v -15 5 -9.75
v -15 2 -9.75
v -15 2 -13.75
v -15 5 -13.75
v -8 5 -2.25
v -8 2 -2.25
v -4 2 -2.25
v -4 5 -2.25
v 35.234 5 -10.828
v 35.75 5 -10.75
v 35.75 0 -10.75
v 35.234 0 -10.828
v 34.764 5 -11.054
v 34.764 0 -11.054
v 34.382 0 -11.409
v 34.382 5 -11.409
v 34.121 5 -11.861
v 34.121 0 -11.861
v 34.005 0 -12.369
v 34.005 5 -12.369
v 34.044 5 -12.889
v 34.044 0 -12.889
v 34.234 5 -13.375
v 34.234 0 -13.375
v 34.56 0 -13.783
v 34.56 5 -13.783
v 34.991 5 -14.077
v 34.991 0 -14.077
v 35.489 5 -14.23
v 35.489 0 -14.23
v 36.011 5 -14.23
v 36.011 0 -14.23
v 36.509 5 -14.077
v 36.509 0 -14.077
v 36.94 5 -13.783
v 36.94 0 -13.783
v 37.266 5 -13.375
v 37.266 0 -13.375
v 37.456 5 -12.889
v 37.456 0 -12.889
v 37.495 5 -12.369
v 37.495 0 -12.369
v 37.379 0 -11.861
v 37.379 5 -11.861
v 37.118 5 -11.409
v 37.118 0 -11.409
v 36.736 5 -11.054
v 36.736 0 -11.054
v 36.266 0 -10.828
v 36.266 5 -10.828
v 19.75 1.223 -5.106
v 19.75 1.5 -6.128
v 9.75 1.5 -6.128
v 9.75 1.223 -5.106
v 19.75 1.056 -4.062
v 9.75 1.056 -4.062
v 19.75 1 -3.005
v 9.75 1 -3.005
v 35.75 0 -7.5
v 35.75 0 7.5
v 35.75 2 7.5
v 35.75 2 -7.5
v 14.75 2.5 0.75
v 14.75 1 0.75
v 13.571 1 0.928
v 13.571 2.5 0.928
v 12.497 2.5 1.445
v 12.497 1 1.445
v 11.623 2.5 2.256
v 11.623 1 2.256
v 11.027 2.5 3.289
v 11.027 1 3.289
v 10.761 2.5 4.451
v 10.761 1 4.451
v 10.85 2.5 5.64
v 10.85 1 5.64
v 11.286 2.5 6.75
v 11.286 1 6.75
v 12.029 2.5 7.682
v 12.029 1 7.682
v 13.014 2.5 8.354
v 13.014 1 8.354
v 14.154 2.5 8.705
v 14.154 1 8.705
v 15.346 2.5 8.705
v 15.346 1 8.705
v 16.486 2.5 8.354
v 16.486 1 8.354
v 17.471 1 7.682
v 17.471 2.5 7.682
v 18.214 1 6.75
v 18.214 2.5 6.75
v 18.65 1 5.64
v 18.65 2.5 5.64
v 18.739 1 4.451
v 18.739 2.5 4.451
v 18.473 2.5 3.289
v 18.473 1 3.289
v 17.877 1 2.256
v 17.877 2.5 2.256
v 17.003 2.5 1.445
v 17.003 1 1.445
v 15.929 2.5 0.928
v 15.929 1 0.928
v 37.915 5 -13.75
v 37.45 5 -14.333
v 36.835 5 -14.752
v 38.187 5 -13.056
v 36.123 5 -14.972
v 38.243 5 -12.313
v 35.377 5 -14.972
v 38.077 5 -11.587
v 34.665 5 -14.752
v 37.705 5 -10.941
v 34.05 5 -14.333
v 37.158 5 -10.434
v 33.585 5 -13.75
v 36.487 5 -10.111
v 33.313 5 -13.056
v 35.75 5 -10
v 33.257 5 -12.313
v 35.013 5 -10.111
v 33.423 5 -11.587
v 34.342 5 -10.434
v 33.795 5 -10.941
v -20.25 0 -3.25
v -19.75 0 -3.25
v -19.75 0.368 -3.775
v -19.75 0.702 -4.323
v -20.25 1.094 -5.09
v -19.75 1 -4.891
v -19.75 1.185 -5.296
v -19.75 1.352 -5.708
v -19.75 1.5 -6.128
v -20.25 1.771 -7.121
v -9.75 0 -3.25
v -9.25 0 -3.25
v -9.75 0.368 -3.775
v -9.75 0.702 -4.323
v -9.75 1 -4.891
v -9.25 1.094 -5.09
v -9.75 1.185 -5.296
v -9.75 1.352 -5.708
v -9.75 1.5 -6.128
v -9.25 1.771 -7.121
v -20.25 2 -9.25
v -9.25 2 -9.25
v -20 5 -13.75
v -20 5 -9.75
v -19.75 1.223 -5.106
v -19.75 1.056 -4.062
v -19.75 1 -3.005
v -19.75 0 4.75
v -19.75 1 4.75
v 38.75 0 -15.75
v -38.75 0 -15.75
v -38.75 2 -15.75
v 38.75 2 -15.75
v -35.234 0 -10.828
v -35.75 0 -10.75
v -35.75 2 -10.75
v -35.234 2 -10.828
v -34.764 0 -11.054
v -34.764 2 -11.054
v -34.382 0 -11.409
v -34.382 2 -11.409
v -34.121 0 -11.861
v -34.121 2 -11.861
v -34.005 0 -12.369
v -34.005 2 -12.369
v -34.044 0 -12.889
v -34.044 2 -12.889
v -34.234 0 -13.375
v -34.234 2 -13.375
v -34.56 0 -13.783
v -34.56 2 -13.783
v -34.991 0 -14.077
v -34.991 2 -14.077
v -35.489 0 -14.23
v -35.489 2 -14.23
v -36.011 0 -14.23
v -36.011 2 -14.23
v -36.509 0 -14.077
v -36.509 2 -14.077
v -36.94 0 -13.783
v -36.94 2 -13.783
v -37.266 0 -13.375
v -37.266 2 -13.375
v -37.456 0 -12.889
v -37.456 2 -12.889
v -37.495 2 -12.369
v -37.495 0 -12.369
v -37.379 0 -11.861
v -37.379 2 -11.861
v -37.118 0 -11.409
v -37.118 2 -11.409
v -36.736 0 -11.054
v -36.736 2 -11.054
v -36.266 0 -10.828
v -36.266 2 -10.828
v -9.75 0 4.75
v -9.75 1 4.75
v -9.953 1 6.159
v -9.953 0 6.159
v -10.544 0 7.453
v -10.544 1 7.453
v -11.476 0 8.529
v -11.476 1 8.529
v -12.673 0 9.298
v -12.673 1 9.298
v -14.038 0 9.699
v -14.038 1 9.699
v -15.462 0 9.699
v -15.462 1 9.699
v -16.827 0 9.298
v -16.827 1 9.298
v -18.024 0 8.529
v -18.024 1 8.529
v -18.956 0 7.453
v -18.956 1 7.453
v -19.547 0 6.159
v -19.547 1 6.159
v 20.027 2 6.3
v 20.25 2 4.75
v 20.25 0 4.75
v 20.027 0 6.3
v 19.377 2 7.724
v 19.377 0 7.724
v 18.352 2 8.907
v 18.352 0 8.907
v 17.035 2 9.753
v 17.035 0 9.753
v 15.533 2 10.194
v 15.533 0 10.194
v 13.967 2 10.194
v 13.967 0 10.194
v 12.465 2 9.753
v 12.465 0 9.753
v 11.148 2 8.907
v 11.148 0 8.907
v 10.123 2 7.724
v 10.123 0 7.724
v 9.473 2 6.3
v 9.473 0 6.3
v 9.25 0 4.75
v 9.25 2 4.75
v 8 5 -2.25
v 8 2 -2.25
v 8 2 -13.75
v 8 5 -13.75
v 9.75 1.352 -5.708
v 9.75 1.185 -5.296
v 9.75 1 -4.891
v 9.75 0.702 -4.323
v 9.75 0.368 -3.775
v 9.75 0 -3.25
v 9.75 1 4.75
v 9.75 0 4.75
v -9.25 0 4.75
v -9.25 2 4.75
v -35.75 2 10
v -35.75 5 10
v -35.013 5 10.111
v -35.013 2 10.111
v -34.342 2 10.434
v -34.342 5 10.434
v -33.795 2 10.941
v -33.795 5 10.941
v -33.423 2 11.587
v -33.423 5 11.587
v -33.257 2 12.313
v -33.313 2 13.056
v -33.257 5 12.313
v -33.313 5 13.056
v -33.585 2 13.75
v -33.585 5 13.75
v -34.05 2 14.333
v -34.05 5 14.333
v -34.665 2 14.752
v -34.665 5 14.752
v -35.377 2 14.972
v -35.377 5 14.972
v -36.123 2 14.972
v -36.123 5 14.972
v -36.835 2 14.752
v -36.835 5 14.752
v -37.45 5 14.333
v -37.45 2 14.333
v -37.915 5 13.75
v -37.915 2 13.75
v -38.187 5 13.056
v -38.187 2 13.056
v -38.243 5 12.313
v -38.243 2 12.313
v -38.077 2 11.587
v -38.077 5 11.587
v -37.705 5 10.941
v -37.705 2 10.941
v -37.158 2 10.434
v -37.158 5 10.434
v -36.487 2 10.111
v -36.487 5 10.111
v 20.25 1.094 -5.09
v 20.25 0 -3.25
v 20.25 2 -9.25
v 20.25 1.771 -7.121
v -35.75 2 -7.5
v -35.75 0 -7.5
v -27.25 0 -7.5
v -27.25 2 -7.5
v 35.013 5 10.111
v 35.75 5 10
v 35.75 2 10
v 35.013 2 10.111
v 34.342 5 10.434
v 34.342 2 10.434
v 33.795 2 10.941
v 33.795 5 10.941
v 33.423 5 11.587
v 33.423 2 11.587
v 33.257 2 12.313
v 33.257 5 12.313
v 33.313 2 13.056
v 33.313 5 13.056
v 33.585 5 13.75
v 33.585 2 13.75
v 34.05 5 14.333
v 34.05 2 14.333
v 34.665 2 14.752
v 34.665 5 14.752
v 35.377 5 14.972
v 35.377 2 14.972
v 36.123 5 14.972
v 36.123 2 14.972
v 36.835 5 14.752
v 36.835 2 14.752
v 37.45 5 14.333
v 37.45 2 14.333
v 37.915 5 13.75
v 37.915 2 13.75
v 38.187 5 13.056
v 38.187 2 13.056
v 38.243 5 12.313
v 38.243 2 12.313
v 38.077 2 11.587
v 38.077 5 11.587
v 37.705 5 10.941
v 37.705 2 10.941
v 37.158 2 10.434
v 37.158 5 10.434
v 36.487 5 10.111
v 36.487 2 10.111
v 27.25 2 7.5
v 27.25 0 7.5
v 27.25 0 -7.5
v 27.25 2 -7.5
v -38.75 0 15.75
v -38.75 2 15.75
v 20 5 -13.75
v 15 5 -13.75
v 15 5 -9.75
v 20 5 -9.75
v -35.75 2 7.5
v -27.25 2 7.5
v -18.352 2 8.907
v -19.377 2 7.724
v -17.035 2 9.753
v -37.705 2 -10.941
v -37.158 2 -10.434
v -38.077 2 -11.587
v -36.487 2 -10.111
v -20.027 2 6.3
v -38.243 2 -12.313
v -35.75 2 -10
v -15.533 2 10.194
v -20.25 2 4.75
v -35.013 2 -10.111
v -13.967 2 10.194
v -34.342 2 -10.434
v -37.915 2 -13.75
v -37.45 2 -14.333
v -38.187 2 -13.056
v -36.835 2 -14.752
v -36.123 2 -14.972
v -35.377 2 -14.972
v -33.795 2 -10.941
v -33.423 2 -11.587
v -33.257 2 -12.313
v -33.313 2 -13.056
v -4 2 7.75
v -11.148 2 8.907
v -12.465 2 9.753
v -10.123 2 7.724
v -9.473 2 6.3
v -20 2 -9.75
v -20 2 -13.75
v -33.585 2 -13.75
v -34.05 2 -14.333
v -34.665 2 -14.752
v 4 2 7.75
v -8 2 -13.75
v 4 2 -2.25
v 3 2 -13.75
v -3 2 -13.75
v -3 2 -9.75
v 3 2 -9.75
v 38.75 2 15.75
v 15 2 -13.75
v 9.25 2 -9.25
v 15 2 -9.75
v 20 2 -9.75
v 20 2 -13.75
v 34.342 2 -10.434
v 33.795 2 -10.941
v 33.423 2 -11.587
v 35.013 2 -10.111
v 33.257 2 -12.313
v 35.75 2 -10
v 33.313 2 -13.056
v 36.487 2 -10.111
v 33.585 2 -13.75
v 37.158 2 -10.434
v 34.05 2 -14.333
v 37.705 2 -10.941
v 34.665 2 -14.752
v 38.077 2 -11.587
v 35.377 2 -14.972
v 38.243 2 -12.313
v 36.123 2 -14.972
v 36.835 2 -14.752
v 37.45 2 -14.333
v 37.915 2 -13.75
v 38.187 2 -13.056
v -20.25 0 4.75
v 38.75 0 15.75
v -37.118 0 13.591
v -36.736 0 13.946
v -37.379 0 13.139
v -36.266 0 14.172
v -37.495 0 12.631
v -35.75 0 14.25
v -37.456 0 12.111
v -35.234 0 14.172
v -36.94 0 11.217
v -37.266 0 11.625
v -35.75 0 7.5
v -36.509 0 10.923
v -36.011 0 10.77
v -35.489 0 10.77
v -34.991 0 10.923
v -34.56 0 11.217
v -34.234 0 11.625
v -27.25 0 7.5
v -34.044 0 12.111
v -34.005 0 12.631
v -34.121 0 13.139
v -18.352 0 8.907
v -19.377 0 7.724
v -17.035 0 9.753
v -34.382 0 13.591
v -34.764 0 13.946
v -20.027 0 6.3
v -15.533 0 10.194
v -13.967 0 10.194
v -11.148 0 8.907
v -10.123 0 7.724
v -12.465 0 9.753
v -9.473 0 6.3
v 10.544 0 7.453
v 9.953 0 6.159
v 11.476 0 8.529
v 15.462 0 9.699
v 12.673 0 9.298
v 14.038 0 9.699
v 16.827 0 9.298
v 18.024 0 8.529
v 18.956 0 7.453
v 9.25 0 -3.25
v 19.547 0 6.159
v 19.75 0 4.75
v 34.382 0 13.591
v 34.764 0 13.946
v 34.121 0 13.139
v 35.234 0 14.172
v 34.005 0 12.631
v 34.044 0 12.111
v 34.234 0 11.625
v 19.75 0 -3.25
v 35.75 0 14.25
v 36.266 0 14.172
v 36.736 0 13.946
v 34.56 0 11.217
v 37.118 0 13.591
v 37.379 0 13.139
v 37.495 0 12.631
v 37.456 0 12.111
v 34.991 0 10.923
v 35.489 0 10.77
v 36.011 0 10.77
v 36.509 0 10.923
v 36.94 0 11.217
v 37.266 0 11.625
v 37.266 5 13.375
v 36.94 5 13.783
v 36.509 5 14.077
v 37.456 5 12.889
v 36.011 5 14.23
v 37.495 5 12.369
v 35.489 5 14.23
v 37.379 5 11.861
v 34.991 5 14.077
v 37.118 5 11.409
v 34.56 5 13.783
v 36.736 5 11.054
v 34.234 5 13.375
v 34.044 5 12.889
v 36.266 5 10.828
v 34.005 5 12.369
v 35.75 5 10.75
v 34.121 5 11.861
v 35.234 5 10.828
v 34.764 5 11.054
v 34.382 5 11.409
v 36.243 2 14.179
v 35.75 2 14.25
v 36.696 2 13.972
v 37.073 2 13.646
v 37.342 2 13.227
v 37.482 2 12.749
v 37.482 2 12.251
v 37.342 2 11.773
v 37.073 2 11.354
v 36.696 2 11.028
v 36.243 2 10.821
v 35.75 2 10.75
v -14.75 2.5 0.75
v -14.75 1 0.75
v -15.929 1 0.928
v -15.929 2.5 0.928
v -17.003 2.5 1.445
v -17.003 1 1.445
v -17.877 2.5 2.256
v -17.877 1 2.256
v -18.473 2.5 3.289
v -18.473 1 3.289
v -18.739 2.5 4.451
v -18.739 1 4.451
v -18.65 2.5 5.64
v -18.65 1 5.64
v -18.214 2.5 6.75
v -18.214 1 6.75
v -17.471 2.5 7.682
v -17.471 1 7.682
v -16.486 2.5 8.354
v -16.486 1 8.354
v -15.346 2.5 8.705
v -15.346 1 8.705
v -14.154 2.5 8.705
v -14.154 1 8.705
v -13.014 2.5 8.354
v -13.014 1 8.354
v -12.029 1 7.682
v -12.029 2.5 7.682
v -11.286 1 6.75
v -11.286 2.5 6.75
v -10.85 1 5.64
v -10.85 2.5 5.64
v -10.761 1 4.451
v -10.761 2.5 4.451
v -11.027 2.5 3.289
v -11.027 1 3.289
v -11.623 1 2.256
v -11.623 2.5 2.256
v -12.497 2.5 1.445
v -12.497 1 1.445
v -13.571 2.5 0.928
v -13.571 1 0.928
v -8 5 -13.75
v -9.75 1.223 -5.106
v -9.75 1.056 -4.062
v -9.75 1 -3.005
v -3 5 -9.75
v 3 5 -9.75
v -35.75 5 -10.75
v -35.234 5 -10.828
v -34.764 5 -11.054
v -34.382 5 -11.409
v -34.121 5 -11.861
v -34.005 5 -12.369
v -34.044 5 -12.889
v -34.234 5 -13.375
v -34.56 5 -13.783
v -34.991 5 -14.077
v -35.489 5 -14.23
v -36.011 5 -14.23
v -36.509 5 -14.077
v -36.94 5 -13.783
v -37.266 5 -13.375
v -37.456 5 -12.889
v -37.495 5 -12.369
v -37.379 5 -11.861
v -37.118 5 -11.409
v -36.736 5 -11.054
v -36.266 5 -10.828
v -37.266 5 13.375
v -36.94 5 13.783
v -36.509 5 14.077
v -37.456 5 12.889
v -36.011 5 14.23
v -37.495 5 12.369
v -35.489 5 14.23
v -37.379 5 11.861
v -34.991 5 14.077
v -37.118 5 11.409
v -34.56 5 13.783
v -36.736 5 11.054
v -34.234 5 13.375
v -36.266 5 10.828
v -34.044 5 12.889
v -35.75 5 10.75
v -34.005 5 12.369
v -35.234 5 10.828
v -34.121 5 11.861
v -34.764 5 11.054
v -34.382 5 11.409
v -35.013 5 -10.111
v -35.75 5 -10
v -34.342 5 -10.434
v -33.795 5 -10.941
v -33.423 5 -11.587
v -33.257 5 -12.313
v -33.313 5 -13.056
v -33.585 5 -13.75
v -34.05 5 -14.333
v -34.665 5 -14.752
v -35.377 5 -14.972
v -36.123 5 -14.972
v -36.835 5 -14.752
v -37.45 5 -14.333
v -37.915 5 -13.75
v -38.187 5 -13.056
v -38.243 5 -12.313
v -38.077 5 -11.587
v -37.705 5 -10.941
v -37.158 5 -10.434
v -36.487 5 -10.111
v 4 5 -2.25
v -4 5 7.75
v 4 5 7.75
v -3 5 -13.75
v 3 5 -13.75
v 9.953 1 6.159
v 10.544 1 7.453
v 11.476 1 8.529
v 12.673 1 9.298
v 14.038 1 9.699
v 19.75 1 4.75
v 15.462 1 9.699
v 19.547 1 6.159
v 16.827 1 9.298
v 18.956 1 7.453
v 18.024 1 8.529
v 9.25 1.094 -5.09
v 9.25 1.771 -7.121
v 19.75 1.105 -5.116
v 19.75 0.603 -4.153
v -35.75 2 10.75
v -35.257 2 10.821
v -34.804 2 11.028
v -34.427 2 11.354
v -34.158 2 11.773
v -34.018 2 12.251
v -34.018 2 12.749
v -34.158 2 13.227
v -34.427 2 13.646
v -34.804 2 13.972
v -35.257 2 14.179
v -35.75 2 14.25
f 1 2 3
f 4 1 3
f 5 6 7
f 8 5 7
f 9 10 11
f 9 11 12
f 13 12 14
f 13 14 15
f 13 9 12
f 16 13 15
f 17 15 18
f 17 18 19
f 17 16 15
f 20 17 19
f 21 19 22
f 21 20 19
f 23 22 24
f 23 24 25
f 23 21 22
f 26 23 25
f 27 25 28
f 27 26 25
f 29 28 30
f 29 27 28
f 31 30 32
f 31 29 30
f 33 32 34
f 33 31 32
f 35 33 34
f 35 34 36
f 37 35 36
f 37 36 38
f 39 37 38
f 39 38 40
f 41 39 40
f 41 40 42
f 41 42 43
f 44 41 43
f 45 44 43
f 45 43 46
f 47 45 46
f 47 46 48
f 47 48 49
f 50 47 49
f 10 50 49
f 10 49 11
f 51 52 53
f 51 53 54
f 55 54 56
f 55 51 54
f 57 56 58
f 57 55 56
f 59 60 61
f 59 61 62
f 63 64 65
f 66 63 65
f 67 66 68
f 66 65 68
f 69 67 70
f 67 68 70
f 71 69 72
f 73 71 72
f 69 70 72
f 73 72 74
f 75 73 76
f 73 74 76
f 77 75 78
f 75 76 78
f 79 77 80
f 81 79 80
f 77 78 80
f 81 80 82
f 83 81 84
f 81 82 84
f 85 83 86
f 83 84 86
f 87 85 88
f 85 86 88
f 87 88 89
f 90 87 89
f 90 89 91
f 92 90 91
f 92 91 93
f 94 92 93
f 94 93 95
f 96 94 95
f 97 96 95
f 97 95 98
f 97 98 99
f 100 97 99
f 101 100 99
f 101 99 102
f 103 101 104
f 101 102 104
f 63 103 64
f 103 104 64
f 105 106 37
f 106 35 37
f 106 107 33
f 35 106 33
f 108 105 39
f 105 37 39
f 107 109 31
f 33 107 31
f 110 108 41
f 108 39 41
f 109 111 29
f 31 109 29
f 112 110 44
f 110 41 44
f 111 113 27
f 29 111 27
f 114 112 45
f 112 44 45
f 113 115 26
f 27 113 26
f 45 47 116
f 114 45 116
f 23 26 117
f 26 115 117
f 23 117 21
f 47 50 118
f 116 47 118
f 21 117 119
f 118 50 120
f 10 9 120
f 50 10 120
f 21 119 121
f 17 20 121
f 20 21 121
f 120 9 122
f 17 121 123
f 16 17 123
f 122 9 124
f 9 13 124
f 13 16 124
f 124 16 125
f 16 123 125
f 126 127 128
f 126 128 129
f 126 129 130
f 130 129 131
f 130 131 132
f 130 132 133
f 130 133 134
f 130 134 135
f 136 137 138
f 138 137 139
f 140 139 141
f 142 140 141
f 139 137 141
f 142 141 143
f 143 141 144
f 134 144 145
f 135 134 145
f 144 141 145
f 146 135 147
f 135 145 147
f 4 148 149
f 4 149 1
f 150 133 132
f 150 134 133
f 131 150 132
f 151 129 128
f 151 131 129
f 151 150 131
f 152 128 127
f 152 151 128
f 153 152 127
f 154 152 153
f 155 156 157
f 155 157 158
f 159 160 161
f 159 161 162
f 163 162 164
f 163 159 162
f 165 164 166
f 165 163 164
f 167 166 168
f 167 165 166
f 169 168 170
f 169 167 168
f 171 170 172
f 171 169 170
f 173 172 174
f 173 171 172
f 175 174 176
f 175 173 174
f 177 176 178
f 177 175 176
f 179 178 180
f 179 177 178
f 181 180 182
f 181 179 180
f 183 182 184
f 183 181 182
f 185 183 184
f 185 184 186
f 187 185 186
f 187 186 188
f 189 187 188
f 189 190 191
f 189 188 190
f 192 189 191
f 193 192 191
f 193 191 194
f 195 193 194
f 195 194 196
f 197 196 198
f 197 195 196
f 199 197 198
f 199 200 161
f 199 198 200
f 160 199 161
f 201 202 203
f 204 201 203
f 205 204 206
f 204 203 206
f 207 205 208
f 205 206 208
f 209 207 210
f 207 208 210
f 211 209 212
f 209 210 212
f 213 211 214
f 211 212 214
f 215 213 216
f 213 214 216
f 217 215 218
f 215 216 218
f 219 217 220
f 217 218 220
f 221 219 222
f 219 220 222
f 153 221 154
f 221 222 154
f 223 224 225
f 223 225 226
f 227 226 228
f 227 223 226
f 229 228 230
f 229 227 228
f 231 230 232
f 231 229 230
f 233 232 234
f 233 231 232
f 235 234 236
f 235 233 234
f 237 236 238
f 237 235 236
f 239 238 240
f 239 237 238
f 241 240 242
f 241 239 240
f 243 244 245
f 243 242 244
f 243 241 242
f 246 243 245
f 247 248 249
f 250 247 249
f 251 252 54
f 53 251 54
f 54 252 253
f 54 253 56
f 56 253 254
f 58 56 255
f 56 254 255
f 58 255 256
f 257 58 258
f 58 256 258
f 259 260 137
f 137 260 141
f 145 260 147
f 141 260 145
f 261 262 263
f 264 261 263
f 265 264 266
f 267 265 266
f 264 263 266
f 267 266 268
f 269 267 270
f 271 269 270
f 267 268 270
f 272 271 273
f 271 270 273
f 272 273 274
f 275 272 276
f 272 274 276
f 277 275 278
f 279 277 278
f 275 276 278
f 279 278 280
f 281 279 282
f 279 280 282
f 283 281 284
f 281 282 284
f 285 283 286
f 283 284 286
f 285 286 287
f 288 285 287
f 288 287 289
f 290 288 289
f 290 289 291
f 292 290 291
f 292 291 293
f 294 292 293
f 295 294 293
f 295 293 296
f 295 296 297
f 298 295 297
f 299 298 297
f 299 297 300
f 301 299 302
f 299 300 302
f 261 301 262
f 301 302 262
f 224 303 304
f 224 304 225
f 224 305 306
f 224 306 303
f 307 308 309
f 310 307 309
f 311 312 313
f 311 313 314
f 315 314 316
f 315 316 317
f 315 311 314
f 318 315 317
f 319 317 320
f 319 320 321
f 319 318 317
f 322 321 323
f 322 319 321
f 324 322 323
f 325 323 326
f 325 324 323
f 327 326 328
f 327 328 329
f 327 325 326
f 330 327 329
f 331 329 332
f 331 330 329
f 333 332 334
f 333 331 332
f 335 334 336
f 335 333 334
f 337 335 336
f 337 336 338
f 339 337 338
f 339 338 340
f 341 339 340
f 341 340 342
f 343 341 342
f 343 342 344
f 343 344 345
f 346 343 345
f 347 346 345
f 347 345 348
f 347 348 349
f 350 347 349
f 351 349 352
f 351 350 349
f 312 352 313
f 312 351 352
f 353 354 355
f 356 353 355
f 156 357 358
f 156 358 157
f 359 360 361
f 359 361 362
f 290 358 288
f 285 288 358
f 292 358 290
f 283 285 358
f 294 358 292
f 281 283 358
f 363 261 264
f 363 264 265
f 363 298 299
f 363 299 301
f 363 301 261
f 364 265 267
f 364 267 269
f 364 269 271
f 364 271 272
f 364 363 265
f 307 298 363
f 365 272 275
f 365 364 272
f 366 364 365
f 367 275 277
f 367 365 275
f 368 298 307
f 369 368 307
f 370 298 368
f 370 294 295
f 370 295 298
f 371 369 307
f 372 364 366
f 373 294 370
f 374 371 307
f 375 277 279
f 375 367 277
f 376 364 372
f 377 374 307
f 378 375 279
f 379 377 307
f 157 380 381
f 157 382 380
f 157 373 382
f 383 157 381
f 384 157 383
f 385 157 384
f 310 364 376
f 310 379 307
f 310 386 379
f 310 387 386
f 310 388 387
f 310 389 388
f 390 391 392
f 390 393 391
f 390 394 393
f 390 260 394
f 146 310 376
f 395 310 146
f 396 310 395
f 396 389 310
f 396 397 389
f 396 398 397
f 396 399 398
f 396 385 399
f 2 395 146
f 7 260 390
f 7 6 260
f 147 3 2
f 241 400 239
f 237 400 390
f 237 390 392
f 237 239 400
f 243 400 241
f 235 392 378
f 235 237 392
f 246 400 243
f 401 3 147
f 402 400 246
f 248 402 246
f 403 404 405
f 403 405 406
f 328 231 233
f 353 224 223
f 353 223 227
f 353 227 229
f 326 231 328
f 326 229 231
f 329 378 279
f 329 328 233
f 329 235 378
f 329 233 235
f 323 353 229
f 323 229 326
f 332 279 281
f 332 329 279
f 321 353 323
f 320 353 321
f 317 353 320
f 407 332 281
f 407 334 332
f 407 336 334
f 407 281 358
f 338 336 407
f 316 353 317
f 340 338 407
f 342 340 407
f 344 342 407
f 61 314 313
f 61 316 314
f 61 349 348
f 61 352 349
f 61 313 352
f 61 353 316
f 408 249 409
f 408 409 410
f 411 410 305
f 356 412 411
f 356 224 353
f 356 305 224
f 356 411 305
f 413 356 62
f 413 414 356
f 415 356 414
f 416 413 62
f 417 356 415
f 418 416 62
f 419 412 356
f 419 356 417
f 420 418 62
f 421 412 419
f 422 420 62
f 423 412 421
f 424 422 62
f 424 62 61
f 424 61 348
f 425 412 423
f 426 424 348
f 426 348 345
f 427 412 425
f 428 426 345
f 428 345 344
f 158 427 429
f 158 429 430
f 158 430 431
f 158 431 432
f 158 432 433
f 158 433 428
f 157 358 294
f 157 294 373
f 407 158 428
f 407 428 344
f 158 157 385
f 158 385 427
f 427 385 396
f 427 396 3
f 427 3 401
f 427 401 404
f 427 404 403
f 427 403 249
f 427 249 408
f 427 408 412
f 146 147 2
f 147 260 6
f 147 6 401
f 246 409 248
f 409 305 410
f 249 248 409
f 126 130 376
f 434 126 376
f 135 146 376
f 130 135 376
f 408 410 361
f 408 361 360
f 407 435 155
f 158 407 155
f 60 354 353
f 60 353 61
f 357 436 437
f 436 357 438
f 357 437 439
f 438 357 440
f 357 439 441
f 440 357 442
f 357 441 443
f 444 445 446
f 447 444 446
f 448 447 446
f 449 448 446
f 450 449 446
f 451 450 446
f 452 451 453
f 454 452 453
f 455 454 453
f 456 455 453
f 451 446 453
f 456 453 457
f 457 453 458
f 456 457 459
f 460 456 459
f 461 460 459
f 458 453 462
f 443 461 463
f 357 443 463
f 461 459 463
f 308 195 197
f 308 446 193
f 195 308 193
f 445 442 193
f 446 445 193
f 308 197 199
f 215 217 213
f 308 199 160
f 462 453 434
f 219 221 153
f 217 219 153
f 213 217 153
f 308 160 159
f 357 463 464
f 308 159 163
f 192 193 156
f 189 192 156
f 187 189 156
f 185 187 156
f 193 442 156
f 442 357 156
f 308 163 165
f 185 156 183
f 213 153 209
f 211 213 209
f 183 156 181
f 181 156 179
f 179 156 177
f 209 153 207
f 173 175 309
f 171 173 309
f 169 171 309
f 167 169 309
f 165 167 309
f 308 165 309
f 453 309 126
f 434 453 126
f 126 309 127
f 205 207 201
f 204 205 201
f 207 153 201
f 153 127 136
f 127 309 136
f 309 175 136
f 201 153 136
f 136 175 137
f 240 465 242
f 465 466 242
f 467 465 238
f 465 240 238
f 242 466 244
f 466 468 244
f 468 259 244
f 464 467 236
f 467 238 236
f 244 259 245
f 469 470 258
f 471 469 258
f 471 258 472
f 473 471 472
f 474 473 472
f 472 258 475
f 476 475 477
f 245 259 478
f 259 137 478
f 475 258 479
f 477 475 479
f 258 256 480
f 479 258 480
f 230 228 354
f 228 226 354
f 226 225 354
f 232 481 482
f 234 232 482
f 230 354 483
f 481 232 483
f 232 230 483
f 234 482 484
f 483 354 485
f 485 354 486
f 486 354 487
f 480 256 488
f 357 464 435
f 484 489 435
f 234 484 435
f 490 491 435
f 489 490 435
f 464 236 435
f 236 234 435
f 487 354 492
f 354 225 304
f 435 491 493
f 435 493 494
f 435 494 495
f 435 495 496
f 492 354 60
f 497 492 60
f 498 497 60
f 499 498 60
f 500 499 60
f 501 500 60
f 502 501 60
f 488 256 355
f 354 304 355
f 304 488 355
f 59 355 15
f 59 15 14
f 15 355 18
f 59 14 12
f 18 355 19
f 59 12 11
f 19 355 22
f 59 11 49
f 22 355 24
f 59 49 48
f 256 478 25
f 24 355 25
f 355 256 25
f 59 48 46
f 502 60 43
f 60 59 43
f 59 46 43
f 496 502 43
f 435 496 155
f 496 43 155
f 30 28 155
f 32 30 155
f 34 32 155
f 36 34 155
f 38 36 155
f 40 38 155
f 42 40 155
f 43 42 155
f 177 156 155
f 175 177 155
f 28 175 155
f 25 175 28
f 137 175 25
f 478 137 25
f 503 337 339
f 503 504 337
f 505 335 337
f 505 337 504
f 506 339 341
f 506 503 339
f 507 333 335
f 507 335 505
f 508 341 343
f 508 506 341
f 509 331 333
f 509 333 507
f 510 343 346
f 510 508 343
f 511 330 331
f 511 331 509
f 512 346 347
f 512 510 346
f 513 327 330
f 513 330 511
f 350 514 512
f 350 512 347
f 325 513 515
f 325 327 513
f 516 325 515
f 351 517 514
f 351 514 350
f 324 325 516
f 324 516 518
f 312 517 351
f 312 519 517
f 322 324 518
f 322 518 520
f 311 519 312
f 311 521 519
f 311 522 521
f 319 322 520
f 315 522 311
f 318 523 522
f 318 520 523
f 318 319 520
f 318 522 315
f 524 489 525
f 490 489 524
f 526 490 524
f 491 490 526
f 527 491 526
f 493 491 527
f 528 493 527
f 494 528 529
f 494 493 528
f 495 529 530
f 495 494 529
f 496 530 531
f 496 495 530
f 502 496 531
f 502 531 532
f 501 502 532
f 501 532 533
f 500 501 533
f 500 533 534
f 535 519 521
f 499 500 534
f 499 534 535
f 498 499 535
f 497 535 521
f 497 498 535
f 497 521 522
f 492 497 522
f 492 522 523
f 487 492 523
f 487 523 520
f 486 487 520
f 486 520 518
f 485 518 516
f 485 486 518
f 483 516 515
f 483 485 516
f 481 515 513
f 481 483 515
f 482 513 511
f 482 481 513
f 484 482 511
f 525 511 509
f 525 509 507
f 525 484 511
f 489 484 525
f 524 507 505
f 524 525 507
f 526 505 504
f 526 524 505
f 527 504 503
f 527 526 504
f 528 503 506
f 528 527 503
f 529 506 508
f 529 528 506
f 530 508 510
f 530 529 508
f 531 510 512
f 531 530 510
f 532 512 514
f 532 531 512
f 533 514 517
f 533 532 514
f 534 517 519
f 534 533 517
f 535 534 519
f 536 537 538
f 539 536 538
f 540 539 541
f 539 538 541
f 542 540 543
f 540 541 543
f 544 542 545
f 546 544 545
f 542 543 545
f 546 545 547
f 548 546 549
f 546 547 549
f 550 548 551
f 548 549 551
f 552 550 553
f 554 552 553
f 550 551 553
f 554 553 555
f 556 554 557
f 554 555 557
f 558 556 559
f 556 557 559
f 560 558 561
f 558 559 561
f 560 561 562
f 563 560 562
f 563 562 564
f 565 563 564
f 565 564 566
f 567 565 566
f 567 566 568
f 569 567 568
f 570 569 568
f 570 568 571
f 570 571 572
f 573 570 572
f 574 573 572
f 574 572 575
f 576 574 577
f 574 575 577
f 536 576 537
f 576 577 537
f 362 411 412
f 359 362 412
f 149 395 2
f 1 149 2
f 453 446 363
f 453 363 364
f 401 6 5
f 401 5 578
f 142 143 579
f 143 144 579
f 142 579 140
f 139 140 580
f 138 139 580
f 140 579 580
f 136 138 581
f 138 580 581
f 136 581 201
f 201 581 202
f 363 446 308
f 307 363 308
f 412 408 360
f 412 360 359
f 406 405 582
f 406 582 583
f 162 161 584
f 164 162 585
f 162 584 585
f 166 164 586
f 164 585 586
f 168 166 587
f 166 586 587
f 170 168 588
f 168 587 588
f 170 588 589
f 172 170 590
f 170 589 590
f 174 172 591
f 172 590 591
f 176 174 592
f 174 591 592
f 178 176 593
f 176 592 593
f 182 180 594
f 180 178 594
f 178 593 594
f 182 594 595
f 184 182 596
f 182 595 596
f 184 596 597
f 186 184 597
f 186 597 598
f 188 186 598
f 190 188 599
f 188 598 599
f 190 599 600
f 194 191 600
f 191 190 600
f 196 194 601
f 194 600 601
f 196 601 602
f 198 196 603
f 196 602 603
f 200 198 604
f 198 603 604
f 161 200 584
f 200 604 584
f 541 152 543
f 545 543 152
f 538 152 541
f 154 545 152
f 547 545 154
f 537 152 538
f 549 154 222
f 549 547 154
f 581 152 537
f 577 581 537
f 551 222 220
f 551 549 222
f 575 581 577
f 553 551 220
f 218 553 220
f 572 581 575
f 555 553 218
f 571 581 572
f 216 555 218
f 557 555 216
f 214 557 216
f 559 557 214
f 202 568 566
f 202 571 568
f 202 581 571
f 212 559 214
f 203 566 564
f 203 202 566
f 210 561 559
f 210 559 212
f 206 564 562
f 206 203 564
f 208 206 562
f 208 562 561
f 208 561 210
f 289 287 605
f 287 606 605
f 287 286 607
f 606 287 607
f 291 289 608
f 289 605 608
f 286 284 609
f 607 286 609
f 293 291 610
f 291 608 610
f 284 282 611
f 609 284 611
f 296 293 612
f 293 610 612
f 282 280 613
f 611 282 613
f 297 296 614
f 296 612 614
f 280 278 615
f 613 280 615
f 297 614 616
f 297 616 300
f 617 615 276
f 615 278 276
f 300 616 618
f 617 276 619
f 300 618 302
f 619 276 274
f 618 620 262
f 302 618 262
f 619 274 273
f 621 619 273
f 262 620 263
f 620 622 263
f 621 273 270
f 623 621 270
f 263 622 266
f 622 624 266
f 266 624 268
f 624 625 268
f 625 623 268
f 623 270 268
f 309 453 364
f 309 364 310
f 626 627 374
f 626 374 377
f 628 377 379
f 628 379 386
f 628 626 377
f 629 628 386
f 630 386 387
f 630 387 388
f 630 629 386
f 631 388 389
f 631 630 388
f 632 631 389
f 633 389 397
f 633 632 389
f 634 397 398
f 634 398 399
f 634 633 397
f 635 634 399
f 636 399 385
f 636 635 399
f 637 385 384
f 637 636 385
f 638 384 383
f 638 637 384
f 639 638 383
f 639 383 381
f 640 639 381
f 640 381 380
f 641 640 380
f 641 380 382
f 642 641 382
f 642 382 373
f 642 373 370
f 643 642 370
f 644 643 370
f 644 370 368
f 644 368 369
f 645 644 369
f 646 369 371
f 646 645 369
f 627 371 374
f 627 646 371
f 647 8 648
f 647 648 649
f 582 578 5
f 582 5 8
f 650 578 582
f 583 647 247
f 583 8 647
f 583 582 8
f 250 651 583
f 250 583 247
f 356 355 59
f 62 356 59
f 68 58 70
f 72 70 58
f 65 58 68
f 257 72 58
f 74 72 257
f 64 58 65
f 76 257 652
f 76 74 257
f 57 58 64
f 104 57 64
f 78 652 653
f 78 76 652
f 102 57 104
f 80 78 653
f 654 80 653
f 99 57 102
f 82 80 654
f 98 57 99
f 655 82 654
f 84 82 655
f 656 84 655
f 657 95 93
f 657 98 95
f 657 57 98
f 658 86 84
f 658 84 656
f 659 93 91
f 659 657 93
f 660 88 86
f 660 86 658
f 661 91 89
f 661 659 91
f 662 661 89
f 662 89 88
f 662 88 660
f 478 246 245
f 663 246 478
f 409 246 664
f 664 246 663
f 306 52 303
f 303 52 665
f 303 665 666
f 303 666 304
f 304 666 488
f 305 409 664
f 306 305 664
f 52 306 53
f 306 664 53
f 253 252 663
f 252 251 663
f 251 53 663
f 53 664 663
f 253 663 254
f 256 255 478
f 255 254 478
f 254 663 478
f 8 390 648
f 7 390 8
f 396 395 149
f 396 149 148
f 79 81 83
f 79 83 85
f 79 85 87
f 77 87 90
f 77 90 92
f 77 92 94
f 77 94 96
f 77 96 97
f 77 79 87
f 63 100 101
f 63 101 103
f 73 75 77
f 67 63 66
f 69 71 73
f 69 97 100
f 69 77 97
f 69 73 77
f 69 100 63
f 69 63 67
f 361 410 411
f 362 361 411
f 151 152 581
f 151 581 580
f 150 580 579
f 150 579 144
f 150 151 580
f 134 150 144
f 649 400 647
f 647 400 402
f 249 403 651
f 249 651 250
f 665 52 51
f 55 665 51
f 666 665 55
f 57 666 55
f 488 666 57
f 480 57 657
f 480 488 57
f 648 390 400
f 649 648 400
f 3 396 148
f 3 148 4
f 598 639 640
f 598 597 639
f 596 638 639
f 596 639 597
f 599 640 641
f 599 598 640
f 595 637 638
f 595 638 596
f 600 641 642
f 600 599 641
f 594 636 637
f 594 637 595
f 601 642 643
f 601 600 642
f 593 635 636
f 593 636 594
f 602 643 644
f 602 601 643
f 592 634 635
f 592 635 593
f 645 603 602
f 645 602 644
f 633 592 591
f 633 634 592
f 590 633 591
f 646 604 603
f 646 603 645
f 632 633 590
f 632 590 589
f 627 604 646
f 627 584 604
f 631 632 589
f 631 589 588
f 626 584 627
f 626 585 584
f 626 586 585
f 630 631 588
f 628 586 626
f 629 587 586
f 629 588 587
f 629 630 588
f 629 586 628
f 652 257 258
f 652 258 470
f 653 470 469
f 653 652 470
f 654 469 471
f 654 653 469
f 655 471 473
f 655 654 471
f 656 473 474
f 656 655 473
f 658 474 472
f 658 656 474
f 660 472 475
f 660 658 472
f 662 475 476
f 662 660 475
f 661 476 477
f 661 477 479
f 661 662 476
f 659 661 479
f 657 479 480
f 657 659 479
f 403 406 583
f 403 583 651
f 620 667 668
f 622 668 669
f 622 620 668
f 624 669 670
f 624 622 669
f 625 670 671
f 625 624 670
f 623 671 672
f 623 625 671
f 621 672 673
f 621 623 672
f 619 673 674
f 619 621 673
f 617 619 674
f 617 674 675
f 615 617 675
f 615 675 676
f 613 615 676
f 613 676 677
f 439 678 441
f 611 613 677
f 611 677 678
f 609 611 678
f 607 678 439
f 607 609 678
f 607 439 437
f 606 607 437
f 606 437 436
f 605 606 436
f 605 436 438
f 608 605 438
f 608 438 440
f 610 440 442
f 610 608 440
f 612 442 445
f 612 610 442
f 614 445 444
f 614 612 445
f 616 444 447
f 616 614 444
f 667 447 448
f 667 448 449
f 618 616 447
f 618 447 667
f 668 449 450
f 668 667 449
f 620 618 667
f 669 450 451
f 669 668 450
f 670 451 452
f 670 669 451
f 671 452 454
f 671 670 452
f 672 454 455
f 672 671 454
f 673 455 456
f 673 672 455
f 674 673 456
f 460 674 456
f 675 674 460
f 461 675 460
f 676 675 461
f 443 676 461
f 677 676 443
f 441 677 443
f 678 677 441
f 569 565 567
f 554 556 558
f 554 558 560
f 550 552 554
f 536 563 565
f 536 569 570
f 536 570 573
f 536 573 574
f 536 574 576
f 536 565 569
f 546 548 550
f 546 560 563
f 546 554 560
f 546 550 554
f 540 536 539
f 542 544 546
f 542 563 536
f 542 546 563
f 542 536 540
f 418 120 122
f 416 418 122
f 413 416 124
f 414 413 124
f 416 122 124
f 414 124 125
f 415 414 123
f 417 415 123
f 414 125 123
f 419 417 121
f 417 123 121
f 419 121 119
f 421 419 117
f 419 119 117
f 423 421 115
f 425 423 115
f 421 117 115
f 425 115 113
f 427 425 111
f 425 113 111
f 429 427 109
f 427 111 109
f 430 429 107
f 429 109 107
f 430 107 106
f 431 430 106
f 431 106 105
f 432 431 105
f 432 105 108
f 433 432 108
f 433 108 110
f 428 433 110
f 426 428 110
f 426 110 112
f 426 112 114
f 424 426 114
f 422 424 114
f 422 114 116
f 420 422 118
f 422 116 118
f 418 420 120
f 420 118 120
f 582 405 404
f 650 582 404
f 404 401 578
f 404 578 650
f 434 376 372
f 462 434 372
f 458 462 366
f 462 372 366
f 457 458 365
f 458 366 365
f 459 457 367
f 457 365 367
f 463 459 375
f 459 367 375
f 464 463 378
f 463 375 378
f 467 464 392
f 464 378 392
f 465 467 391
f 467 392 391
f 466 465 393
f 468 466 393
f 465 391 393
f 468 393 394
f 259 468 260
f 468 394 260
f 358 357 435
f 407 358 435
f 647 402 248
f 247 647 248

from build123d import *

# Parameters (mm, degrees)
SKETCH1_W                 = 77.5
SKETCH1_H                 = 31.5
BOSS_EXTRUDE1_DEPTH       = 2
CUT_EXTRUDE1_DEPTH        = 42.87630595
CUT_EXTRUDE1_DEPTH_BACK   = 42.87630595
SKETCH2_R                 = 1.75
CUT_EXTRUDE2_DEPTH        = 42.87630595
CUT_EXTRUDE2_DEPTH_BACK   = 42.87630595
SKETCH3_W                 = 8.5
SKETCH3_H                 = 15
BOSS_EXTRUDE2_START       = 3
SKETCH4_R                 = 2.5
SKETCH4_R_2               = 1.75
BOSS_EXTRUDE2_DEPTH       = 3
MIRROR2_START             = 3
MIRROR2_COPY_1_SKETCH_R   = 2.5
MIRROR2_COPY_1_SKETCH_R_2 = 1.75
MIRROR2_COPY_1_DEPTH      = 3
CUT_EXTRUDE3_DEPTH        = 3.5
SKETCH6_W                 = 8
SKETCH6_H                 = 10
SKETCH6_W_2               = 5
SKETCH6_H_2               = 4
BOSS_EXTRUDE3_DEPTH       = 3
SKETCH7_W                 = 16
SKETCH7_H                 = 7.5
BOSS_EXTRUDE4_DEPTH       = 3
CUT_EXTRUDE4_DEPTH        = 1
FILLET1_R                 = 10
FILLET2_R                 = 10
SKETCH9_R                 = 4
BOSS_EXTRUDE6_DEPTH       = 1.5


with BuildPart() as part:
    # Sketch1 → Boss-Extrude1 (new body)
    with BuildSketch(Plane(origin=(0, 0, 0), x_dir=(1, 0, 0), z_dir=(0, 1, 0))):
        Rectangle(SKETCH1_W, SKETCH1_H)
    extrude(amount=BOSS_EXTRUDE1_DEPTH)

    # Sketch2 → Cut-Extrude1 (cut, two sides: drawn at the far end of the back side and taken through both)
    with BuildSketch(Plane(origin=(0, 2, 0), x_dir=(1, 0, 0), z_dir=(0, 1, 0)).offset(-CUT_EXTRUDE1_DEPTH_BACK)):
        with Locations(Location((-35.75, 12.5, 0), (0, 0, 270))):
            Circle(SKETCH2_R)
        with Locations(Location((-35.75, -12.5, 0), (0, 0, 270))):
            Circle(SKETCH2_R)
        with Locations(Location((35.75, -12.5, 0), (0, 0, 270))):
            Circle(SKETCH2_R)
        with Locations(Location((35.75, 12.5, 0), (0, 0, 270))):
            Circle(SKETCH2_R)
    extrude(amount=CUT_EXTRUDE1_DEPTH + CUT_EXTRUDE1_DEPTH_BACK, mode=Mode.SUBTRACT)

    # Sketch3 → Cut-Extrude2 (cut, two sides: drawn at the far end of the back side and taken through both)
    with BuildSketch(Plane(origin=(0, 2, 0), x_dir=(1, 0, 0), z_dir=(0, 1, 0)).offset(-CUT_EXTRUDE2_DEPTH_BACK)):
        with Locations((31.5, 0)):
            Rectangle(SKETCH3_W, SKETCH3_H)
        with Locations((-31.5, 0)):
            Rectangle(SKETCH3_W, SKETCH3_H)
    extrude(amount=CUT_EXTRUDE2_DEPTH + CUT_EXTRUDE2_DEPTH_BACK, mode=Mode.SUBTRACT)

    # Sketch4 → Boss-Extrude2 (add)
    with BuildSketch(Plane(origin=(0, 2, 0), x_dir=(1, 0, 0), z_dir=(0, 1, 0)).offset(BOSS_EXTRUDE2_START)):
        with Locations(Location((-35.75, 12.5, 0), (0, 0, 270))):
            Circle(SKETCH4_R)
        with Locations(Location((-35.75, 12.5, 0), (0, 0, 270))):
            Circle(SKETCH4_R_2, mode=Mode.SUBTRACT)
    boss_extrude2 = extrude(amount=-BOSS_EXTRUDE2_DEPTH)

    # Mirror1: Boss-Extrude2 across plane
    add(boss_extrude2.mirror(Plane.XY))

    # Mirror2: Boss-Extrude2 across plane
    add(boss_extrude2.mirror(Plane(origin=(0, 0, 0), x_dir=(0, 0, 1), z_dir=(1, 0, 0))))

    # Mirror2 copy 1 sketch → Mirror2 copy 1 (add)
    with BuildSketch(Plane(origin=(0, 2, 0), x_dir=(-1, 0, 0), z_dir=(0, 1, 0)).offset(MIRROR2_START)):
        with Locations(Location((-35.75, 12.5, 0), (0, 0, 270))):
            Circle(MIRROR2_COPY_1_SKETCH_R)
        with Locations(Location((-35.75, 12.5, 0), (0, 0, 270))):
            Circle(MIRROR2_COPY_1_SKETCH_R_2, mode=Mode.SUBTRACT)
    extrude(amount=-MIRROR2_COPY_1_DEPTH)

    # Sketch5 → Cut-Extrude3 (cut)
    with BuildSketch(Plane(origin=(0, 2, 0), x_dir=(1, 0, 0), z_dir=(0, 1, 0))):
        with BuildLine():
            Line((19.75, -4.75), (19.75, 3.25))
            Line((19.75, 3.25), (20.25, 3.25))
            Line((20.25, 3.25), (20.25, -4.75))
            ThreePointArc((20.25, -4.75), (14.75, -10.25), (9.25, -4.75))
            Line((9.25, -4.75), (9.25, 3.25))
            Line((9.25, 3.25), (9.75, 3.25))
            Line((9.75, 3.25), (9.75, -4.75))
            ThreePointArc((9.75, -4.75), (14.75, -9.75), (19.75, -4.75))
        make_face()
        with BuildLine():
            Line((-19.75, 3.25), (-20.25, 3.25))
            Line((-20.25, 3.25), (-20.25, -4.75))
            ThreePointArc((-20.25, -4.75), (-14.75, -10.25), (-9.25, -4.75))
            Line((-9.25, -4.75), (-9.25, 3.25))
            Line((-9.25, 3.25), (-9.75, 3.25))
            Line((-9.75, 3.25), (-9.75, -4.75))
            ThreePointArc((-9.75, -4.75), (-14.75, -9.75), (-19.75, -4.75))
            Line((-19.75, -4.75), (-19.75, 3.25))
        make_face()
    extrude(amount=-CUT_EXTRUDE3_DEPTH, mode=Mode.SUBTRACT)

    # Sketch6 → Boss-Extrude3 (add)
    with BuildSketch(Plane(origin=(0, 2, 0), x_dir=(1, 0, 0), z_dir=(0, 1, 0))):
        with Locations((0, -2.75)):
            Rectangle(SKETCH6_W, SKETCH6_H)
        with Locations((5.5, 11.75)):
            Rectangle(SKETCH6_W_2, SKETCH6_H_2)
        with Locations((17.5, 11.75)):
            Rectangle(SKETCH6_W_2, SKETCH6_H_2)
        with Locations((-17.5, 11.75)):
            Rectangle(SKETCH6_W_2, SKETCH6_H_2)
        with Locations((-5.5, 11.75)):
            Rectangle(SKETCH6_W_2, SKETCH6_H_2)
    extrude(amount=BOSS_EXTRUDE3_DEPTH)

    # Sketch7 → Boss-Extrude4 (add)
    with BuildSketch(Plane(origin=(0, 2, 0), x_dir=(1, 0, 0), z_dir=(0, 1, 0))):
        with Locations((0, 6)):
            Rectangle(SKETCH7_W, SKETCH7_H)
    extrude(amount=BOSS_EXTRUDE4_DEPTH)

    # Sketch8 → Cut-Extrude4 (cut)
    with BuildSketch(Plane(origin=(0, 2, 0), x_dir=(1, 0, 0), z_dir=(0, 1, 0))):
        with BuildLine():
            Line((-9.75, 3.25), (-9.75, -4.75))
            ThreePointArc((-9.75, -4.75), (-14.75, -9.75), (-19.75, -4.75))
            Line((-19.75, -4.75), (-19.75, 3.25))
            Line((-19.75, 3.25), (-9.75, 3.25))
        make_face()
        with BuildLine():
            Line((19.75, 3.25), (9.75, 3.25))
            Line((9.75, 3.25), (9.75, -4.75))
            ThreePointArc((9.75, -4.75), (14.75, -9.75), (19.75, -4.75))
            Line((19.75, -4.75), (19.75, 3.25))
        make_face()
    extrude(amount=-CUT_EXTRUDE4_DEPTH, mode=Mode.SUBTRACT)

    # Fillet1
    # the kernel refuses this fillet: 10 mm, written as the material it takes off along each edge
    with BuildSketch(Plane(origin=(-4.75, 2, -3.25), x_dir=(0, 0, -1), z_dir=(-1, 0, 0))) as fillet1_piece_1_section:
        with BuildLine():
            CenterArc((6, 10), FILLET1_R, 233.130102354, 36.869897646)
            Line((0, 2), (0, 0))
            Line((0, 0), (6, 0))
        make_face()
    fillet1_piece_1 = extrude(amount=15.5, mode=Mode.PRIVATE)
    fillet1_piece_1 = split(fillet1_piece_1, bisect_by=Plane(origin=(-9.25, 2, -3.25), z_dir=(-1, 0, 0)), keep=Keep.TOP, mode=Mode.PRIVATE)
    fillet1_piece_1 = split(fillet1_piece_1, bisect_by=Plane(origin=(-4.75, 1, -3.25), z_dir=(0, 1, 0)), keep=Keep.TOP, mode=Mode.PRIVATE)
    add(fillet1_piece_1, mode=Mode.SUBTRACT)
    with BuildSketch(Plane(origin=(-4.75, 2, -3.25), x_dir=(0, 0, -1), z_dir=(-1, 0, 0))) as fillet1_piece_2_section:
        with BuildLine():
            CenterArc((6, 10), FILLET1_R, 233.130102354, 36.869897646)
            Line((0, 2), (0, 0))
            Line((0, 0), (6, 0))
        make_face()
    fillet1_piece_2 = extrude(amount=30.5, mode=Mode.PRIVATE)
    fillet1_piece_2 = split(fillet1_piece_2, bisect_by=Plane(origin=(-9.25, 2, -3.25), z_dir=(-1, 0, 0)), keep=Keep.TOP, mode=Mode.PRIVATE)
    fillet1_piece_2 = split(fillet1_piece_2, bisect_by=Plane(origin=(-9.75, 2, -3.25), z_dir=(1, 0, 0)), keep=Keep.TOP, mode=Mode.PRIVATE)
    add(fillet1_piece_2, mode=Mode.SUBTRACT)
    with BuildSketch(Plane(origin=(-19.75, 2, -3.25), x_dir=(0, 0, -1), z_dir=(-1, 0, 0)), Plane(origin=(-9.25, 2, -3.25), x_dir=(0, 0, -1), z_dir=(-1, 0, 0))) as fillet1_piece_3:
        with BuildLine():
            CenterArc((6, 10), FILLET1_R, 233.130102354, 36.869897646)
            Line((0, 2), (0, 0))
            Line((0, 0), (6, 0))
        make_face()
    extrude(amount=0.5, mode=Mode.SUBTRACT)
    with BuildSketch(Plane(origin=(-9.25, 2, -3.25), x_dir=(0, 0, -1), z_dir=(-1, 0, 0))) as fillet1_piece_4_section:
        with BuildLine():
            CenterArc((6, 10), FILLET1_R, 233.130102354, 36.869897646)
            Line((0, 2), (0, 0))
            Line((0, 0), (6, 0))
        make_face()
    fillet1_piece_4 = extrude(amount=15.5, mode=Mode.PRIVATE)
    fillet1_piece_4 = split(fillet1_piece_4, bisect_by=Plane(origin=(-20.25, 2, -3.25), z_dir=(1, 0, 0)), keep=Keep.TOP, mode=Mode.PRIVATE)
    fillet1_piece_4 = split(fillet1_piece_4, bisect_by=Plane(origin=(-9.25, 1, -3.25), z_dir=(0, 1, 0)), keep=Keep.TOP, mode=Mode.PRIVATE)
    add(fillet1_piece_4, mode=Mode.SUBTRACT)
    with BuildSketch(Plane(origin=(5.75, 2, -3.25), x_dir=(0, 0, -1), z_dir=(-1, 0, 0))) as fillet1_piece_5_section:
        with BuildLine():
            CenterArc((6, 10), FILLET1_R, 233.130102354, 36.869897646)
            Line((0, 2), (0, 0))
            Line((0, 0), (6, 0))
        make_face()
    fillet1_piece_5 = extrude(amount=30.5, mode=Mode.PRIVATE)
    fillet1_piece_5 = split(fillet1_piece_5, bisect_by=Plane(origin=(-20.25, 2, -3.25), z_dir=(1, 0, 0)), keep=Keep.TOP, mode=Mode.PRIVATE)
    fillet1_piece_5 = split(fillet1_piece_5, bisect_by=Plane(origin=(-19.75, 2, -3.25), z_dir=(-1, 0, 0)), keep=Keep.TOP, mode=Mode.PRIVATE)
    add(fillet1_piece_5, mode=Mode.SUBTRACT)
    with BuildSketch(Plane(origin=(4.75, 2, -3.25), x_dir=(0, 0, -1), z_dir=(1, 0, 0))) as fillet1_piece_6_section:
        with BuildLine():
            CenterArc((6, -10), FILLET1_R, 90, 36.869897646)
            Line((0, -2), (0, 0))
            Line((0, 0), (6, 0))
        make_face()
    fillet1_piece_6 = extrude(amount=15.5, mode=Mode.PRIVATE)
    fillet1_piece_6 = split(fillet1_piece_6, bisect_by=Plane(origin=(9.25, 2, -3.25), z_dir=(1, 0, 0)), keep=Keep.TOP, mode=Mode.PRIVATE)
    fillet1_piece_6 = split(fillet1_piece_6, bisect_by=Plane(origin=(4.75, 1, -3.25), z_dir=(0, 1, 0)), keep=Keep.TOP, mode=Mode.PRIVATE)
    add(fillet1_piece_6, mode=Mode.SUBTRACT)
    with BuildSketch(Plane(origin=(4.75, 2, -3.25), x_dir=(0, 0, -1), z_dir=(1, 0, 0))) as fillet1_piece_7_section:
        with BuildLine():
            CenterArc((6, -10), FILLET1_R, 90, 36.869897646)
            Line((0, -2), (0, 0))
            Line((0, 0), (6, 0))
        make_face()
    fillet1_piece_7 = extrude(amount=30.5, mode=Mode.PRIVATE)
    fillet1_piece_7 = split(fillet1_piece_7, bisect_by=Plane(origin=(9.75, 2, -3.25), z_dir=(-1, 0, 0)), keep=Keep.TOP, mode=Mode.PRIVATE)
    fillet1_piece_7 = split(fillet1_piece_7, bisect_by=Plane(origin=(9.25, 2, -3.25), z_dir=(1, 0, 0)), keep=Keep.TOP, mode=Mode.PRIVATE)
    add(fillet1_piece_7, mode=Mode.SUBTRACT)
    with BuildSketch(Plane(origin=(19.75, 2, -3.25), x_dir=(0, 0, -1), z_dir=(1, 0, 0)), Plane(origin=(9.25, 2, -3.25), x_dir=(0, 0, -1), z_dir=(1, 0, 0))) as fillet1_piece_8:
        with BuildLine():
            CenterArc((6, -10), FILLET1_R, 90, 36.869897646)
            Line((0, -2), (0, 0))
            Line((0, 0), (6, 0))
        make_face()
    extrude(amount=0.5, mode=Mode.SUBTRACT)
    with BuildSketch(Plane(origin=(9.25, 2, -3.25), x_dir=(0, 0, -1), z_dir=(1, 0, 0))) as fillet1_piece_9_section:
        with BuildLine():
            CenterArc((6, -10), FILLET1_R, 90, 36.869897646)
            Line((0, -2), (0, 0))
            Line((0, 0), (6, 0))
        make_face()
    fillet1_piece_9 = extrude(amount=15.5, mode=Mode.PRIVATE)
    fillet1_piece_9 = split(fillet1_piece_9, bisect_by=Plane(origin=(20.25, 2, -3.25), z_dir=(-1, 0, 0)), keep=Keep.TOP, mode=Mode.PRIVATE)
    fillet1_piece_9 = split(fillet1_piece_9, bisect_by=Plane(origin=(9.25, 1, -3.25), z_dir=(0, 1, 0)), keep=Keep.TOP, mode=Mode.PRIVATE)
    add(fillet1_piece_9, mode=Mode.SUBTRACT)
    with BuildSketch(Plane(origin=(-5.75, 2, -3.25), x_dir=(0, 0, -1), z_dir=(1, 0, 0))) as fillet1_piece_10_section:
        with BuildLine():
            CenterArc((6, -10), FILLET1_R, 90, 36.869897646)
            Line((0, -2), (0, 0))
            Line((0, 0), (6, 0))
        make_face()
    fillet1_piece_10 = extrude(amount=30.5, mode=Mode.PRIVATE)
    fillet1_piece_10 = split(fillet1_piece_10, bisect_by=Plane(origin=(19.75, 2, -3.25), z_dir=(1, 0, 0)), keep=Keep.TOP, mode=Mode.PRIVATE)
    fillet1_piece_10 = split(fillet1_piece_10, bisect_by=Plane(origin=(20.25, 2, -3.25), z_dir=(-1, 0, 0)), keep=Keep.TOP, mode=Mode.PRIVATE)
    add(fillet1_piece_10, mode=Mode.SUBTRACT)

    # Fillet2
    # the kernel refuses this fillet: 10 mm, written as the material it adds along each edge
    with BuildSketch(Plane(origin=(19.75, 1, -4.891101056), x_dir=(0, 0.3749043717325089, -0.9270634886866448), z_dir=(-1, 0, 0))) as fillet2_piece_1:
        with BuildLine():
            CenterArc((2.000510148, -9.977741668), FILLET2_R, 93.823530212, 18.194872339)
            Line((-1.74853357, -0.707106781), (0, 0))
            ThreePointArc((0, 0), (0.666836716, -0.022258332), (1.333673432, 0))
        make_face()
    extrude(amount=10)
    with BuildSketch(Plane(origin=(-19.75, 1, -4.891101056), x_dir=(0, 0.3749043717325089, -0.9270634886866448), z_dir=(1, 0, 0))) as fillet2_piece_2:
        with BuildLine():
            CenterArc((2.000510148, 9.977741668), FILLET2_R, 247.981597449, 18.194872339)
            Line((-1.74853357, 0.707106781), (0, 0))
            ThreePointArc((0, 0), (0.666836716, 0.022258332), (1.333673432, 0))
        make_face()
    extrude(amount=10)

    # Sketch9 → Boss-Extrude6 (add)
    with BuildSketch(Plane(origin=(0, 1, 0), x_dir=(1, 0, 0), z_dir=(0, 1, 0))):
        with Locations(Location((14.75, -4.75, 0), (0, 0, 90))):
            Circle(SKETCH9_R)
        with Locations(Location((-14.75, -4.75, 0), (0, 0, 90))):
            Circle(SKETCH9_R)
    extrude(amount=BOSS_EXTRUDE6_DEPTH)


solid = part.part
